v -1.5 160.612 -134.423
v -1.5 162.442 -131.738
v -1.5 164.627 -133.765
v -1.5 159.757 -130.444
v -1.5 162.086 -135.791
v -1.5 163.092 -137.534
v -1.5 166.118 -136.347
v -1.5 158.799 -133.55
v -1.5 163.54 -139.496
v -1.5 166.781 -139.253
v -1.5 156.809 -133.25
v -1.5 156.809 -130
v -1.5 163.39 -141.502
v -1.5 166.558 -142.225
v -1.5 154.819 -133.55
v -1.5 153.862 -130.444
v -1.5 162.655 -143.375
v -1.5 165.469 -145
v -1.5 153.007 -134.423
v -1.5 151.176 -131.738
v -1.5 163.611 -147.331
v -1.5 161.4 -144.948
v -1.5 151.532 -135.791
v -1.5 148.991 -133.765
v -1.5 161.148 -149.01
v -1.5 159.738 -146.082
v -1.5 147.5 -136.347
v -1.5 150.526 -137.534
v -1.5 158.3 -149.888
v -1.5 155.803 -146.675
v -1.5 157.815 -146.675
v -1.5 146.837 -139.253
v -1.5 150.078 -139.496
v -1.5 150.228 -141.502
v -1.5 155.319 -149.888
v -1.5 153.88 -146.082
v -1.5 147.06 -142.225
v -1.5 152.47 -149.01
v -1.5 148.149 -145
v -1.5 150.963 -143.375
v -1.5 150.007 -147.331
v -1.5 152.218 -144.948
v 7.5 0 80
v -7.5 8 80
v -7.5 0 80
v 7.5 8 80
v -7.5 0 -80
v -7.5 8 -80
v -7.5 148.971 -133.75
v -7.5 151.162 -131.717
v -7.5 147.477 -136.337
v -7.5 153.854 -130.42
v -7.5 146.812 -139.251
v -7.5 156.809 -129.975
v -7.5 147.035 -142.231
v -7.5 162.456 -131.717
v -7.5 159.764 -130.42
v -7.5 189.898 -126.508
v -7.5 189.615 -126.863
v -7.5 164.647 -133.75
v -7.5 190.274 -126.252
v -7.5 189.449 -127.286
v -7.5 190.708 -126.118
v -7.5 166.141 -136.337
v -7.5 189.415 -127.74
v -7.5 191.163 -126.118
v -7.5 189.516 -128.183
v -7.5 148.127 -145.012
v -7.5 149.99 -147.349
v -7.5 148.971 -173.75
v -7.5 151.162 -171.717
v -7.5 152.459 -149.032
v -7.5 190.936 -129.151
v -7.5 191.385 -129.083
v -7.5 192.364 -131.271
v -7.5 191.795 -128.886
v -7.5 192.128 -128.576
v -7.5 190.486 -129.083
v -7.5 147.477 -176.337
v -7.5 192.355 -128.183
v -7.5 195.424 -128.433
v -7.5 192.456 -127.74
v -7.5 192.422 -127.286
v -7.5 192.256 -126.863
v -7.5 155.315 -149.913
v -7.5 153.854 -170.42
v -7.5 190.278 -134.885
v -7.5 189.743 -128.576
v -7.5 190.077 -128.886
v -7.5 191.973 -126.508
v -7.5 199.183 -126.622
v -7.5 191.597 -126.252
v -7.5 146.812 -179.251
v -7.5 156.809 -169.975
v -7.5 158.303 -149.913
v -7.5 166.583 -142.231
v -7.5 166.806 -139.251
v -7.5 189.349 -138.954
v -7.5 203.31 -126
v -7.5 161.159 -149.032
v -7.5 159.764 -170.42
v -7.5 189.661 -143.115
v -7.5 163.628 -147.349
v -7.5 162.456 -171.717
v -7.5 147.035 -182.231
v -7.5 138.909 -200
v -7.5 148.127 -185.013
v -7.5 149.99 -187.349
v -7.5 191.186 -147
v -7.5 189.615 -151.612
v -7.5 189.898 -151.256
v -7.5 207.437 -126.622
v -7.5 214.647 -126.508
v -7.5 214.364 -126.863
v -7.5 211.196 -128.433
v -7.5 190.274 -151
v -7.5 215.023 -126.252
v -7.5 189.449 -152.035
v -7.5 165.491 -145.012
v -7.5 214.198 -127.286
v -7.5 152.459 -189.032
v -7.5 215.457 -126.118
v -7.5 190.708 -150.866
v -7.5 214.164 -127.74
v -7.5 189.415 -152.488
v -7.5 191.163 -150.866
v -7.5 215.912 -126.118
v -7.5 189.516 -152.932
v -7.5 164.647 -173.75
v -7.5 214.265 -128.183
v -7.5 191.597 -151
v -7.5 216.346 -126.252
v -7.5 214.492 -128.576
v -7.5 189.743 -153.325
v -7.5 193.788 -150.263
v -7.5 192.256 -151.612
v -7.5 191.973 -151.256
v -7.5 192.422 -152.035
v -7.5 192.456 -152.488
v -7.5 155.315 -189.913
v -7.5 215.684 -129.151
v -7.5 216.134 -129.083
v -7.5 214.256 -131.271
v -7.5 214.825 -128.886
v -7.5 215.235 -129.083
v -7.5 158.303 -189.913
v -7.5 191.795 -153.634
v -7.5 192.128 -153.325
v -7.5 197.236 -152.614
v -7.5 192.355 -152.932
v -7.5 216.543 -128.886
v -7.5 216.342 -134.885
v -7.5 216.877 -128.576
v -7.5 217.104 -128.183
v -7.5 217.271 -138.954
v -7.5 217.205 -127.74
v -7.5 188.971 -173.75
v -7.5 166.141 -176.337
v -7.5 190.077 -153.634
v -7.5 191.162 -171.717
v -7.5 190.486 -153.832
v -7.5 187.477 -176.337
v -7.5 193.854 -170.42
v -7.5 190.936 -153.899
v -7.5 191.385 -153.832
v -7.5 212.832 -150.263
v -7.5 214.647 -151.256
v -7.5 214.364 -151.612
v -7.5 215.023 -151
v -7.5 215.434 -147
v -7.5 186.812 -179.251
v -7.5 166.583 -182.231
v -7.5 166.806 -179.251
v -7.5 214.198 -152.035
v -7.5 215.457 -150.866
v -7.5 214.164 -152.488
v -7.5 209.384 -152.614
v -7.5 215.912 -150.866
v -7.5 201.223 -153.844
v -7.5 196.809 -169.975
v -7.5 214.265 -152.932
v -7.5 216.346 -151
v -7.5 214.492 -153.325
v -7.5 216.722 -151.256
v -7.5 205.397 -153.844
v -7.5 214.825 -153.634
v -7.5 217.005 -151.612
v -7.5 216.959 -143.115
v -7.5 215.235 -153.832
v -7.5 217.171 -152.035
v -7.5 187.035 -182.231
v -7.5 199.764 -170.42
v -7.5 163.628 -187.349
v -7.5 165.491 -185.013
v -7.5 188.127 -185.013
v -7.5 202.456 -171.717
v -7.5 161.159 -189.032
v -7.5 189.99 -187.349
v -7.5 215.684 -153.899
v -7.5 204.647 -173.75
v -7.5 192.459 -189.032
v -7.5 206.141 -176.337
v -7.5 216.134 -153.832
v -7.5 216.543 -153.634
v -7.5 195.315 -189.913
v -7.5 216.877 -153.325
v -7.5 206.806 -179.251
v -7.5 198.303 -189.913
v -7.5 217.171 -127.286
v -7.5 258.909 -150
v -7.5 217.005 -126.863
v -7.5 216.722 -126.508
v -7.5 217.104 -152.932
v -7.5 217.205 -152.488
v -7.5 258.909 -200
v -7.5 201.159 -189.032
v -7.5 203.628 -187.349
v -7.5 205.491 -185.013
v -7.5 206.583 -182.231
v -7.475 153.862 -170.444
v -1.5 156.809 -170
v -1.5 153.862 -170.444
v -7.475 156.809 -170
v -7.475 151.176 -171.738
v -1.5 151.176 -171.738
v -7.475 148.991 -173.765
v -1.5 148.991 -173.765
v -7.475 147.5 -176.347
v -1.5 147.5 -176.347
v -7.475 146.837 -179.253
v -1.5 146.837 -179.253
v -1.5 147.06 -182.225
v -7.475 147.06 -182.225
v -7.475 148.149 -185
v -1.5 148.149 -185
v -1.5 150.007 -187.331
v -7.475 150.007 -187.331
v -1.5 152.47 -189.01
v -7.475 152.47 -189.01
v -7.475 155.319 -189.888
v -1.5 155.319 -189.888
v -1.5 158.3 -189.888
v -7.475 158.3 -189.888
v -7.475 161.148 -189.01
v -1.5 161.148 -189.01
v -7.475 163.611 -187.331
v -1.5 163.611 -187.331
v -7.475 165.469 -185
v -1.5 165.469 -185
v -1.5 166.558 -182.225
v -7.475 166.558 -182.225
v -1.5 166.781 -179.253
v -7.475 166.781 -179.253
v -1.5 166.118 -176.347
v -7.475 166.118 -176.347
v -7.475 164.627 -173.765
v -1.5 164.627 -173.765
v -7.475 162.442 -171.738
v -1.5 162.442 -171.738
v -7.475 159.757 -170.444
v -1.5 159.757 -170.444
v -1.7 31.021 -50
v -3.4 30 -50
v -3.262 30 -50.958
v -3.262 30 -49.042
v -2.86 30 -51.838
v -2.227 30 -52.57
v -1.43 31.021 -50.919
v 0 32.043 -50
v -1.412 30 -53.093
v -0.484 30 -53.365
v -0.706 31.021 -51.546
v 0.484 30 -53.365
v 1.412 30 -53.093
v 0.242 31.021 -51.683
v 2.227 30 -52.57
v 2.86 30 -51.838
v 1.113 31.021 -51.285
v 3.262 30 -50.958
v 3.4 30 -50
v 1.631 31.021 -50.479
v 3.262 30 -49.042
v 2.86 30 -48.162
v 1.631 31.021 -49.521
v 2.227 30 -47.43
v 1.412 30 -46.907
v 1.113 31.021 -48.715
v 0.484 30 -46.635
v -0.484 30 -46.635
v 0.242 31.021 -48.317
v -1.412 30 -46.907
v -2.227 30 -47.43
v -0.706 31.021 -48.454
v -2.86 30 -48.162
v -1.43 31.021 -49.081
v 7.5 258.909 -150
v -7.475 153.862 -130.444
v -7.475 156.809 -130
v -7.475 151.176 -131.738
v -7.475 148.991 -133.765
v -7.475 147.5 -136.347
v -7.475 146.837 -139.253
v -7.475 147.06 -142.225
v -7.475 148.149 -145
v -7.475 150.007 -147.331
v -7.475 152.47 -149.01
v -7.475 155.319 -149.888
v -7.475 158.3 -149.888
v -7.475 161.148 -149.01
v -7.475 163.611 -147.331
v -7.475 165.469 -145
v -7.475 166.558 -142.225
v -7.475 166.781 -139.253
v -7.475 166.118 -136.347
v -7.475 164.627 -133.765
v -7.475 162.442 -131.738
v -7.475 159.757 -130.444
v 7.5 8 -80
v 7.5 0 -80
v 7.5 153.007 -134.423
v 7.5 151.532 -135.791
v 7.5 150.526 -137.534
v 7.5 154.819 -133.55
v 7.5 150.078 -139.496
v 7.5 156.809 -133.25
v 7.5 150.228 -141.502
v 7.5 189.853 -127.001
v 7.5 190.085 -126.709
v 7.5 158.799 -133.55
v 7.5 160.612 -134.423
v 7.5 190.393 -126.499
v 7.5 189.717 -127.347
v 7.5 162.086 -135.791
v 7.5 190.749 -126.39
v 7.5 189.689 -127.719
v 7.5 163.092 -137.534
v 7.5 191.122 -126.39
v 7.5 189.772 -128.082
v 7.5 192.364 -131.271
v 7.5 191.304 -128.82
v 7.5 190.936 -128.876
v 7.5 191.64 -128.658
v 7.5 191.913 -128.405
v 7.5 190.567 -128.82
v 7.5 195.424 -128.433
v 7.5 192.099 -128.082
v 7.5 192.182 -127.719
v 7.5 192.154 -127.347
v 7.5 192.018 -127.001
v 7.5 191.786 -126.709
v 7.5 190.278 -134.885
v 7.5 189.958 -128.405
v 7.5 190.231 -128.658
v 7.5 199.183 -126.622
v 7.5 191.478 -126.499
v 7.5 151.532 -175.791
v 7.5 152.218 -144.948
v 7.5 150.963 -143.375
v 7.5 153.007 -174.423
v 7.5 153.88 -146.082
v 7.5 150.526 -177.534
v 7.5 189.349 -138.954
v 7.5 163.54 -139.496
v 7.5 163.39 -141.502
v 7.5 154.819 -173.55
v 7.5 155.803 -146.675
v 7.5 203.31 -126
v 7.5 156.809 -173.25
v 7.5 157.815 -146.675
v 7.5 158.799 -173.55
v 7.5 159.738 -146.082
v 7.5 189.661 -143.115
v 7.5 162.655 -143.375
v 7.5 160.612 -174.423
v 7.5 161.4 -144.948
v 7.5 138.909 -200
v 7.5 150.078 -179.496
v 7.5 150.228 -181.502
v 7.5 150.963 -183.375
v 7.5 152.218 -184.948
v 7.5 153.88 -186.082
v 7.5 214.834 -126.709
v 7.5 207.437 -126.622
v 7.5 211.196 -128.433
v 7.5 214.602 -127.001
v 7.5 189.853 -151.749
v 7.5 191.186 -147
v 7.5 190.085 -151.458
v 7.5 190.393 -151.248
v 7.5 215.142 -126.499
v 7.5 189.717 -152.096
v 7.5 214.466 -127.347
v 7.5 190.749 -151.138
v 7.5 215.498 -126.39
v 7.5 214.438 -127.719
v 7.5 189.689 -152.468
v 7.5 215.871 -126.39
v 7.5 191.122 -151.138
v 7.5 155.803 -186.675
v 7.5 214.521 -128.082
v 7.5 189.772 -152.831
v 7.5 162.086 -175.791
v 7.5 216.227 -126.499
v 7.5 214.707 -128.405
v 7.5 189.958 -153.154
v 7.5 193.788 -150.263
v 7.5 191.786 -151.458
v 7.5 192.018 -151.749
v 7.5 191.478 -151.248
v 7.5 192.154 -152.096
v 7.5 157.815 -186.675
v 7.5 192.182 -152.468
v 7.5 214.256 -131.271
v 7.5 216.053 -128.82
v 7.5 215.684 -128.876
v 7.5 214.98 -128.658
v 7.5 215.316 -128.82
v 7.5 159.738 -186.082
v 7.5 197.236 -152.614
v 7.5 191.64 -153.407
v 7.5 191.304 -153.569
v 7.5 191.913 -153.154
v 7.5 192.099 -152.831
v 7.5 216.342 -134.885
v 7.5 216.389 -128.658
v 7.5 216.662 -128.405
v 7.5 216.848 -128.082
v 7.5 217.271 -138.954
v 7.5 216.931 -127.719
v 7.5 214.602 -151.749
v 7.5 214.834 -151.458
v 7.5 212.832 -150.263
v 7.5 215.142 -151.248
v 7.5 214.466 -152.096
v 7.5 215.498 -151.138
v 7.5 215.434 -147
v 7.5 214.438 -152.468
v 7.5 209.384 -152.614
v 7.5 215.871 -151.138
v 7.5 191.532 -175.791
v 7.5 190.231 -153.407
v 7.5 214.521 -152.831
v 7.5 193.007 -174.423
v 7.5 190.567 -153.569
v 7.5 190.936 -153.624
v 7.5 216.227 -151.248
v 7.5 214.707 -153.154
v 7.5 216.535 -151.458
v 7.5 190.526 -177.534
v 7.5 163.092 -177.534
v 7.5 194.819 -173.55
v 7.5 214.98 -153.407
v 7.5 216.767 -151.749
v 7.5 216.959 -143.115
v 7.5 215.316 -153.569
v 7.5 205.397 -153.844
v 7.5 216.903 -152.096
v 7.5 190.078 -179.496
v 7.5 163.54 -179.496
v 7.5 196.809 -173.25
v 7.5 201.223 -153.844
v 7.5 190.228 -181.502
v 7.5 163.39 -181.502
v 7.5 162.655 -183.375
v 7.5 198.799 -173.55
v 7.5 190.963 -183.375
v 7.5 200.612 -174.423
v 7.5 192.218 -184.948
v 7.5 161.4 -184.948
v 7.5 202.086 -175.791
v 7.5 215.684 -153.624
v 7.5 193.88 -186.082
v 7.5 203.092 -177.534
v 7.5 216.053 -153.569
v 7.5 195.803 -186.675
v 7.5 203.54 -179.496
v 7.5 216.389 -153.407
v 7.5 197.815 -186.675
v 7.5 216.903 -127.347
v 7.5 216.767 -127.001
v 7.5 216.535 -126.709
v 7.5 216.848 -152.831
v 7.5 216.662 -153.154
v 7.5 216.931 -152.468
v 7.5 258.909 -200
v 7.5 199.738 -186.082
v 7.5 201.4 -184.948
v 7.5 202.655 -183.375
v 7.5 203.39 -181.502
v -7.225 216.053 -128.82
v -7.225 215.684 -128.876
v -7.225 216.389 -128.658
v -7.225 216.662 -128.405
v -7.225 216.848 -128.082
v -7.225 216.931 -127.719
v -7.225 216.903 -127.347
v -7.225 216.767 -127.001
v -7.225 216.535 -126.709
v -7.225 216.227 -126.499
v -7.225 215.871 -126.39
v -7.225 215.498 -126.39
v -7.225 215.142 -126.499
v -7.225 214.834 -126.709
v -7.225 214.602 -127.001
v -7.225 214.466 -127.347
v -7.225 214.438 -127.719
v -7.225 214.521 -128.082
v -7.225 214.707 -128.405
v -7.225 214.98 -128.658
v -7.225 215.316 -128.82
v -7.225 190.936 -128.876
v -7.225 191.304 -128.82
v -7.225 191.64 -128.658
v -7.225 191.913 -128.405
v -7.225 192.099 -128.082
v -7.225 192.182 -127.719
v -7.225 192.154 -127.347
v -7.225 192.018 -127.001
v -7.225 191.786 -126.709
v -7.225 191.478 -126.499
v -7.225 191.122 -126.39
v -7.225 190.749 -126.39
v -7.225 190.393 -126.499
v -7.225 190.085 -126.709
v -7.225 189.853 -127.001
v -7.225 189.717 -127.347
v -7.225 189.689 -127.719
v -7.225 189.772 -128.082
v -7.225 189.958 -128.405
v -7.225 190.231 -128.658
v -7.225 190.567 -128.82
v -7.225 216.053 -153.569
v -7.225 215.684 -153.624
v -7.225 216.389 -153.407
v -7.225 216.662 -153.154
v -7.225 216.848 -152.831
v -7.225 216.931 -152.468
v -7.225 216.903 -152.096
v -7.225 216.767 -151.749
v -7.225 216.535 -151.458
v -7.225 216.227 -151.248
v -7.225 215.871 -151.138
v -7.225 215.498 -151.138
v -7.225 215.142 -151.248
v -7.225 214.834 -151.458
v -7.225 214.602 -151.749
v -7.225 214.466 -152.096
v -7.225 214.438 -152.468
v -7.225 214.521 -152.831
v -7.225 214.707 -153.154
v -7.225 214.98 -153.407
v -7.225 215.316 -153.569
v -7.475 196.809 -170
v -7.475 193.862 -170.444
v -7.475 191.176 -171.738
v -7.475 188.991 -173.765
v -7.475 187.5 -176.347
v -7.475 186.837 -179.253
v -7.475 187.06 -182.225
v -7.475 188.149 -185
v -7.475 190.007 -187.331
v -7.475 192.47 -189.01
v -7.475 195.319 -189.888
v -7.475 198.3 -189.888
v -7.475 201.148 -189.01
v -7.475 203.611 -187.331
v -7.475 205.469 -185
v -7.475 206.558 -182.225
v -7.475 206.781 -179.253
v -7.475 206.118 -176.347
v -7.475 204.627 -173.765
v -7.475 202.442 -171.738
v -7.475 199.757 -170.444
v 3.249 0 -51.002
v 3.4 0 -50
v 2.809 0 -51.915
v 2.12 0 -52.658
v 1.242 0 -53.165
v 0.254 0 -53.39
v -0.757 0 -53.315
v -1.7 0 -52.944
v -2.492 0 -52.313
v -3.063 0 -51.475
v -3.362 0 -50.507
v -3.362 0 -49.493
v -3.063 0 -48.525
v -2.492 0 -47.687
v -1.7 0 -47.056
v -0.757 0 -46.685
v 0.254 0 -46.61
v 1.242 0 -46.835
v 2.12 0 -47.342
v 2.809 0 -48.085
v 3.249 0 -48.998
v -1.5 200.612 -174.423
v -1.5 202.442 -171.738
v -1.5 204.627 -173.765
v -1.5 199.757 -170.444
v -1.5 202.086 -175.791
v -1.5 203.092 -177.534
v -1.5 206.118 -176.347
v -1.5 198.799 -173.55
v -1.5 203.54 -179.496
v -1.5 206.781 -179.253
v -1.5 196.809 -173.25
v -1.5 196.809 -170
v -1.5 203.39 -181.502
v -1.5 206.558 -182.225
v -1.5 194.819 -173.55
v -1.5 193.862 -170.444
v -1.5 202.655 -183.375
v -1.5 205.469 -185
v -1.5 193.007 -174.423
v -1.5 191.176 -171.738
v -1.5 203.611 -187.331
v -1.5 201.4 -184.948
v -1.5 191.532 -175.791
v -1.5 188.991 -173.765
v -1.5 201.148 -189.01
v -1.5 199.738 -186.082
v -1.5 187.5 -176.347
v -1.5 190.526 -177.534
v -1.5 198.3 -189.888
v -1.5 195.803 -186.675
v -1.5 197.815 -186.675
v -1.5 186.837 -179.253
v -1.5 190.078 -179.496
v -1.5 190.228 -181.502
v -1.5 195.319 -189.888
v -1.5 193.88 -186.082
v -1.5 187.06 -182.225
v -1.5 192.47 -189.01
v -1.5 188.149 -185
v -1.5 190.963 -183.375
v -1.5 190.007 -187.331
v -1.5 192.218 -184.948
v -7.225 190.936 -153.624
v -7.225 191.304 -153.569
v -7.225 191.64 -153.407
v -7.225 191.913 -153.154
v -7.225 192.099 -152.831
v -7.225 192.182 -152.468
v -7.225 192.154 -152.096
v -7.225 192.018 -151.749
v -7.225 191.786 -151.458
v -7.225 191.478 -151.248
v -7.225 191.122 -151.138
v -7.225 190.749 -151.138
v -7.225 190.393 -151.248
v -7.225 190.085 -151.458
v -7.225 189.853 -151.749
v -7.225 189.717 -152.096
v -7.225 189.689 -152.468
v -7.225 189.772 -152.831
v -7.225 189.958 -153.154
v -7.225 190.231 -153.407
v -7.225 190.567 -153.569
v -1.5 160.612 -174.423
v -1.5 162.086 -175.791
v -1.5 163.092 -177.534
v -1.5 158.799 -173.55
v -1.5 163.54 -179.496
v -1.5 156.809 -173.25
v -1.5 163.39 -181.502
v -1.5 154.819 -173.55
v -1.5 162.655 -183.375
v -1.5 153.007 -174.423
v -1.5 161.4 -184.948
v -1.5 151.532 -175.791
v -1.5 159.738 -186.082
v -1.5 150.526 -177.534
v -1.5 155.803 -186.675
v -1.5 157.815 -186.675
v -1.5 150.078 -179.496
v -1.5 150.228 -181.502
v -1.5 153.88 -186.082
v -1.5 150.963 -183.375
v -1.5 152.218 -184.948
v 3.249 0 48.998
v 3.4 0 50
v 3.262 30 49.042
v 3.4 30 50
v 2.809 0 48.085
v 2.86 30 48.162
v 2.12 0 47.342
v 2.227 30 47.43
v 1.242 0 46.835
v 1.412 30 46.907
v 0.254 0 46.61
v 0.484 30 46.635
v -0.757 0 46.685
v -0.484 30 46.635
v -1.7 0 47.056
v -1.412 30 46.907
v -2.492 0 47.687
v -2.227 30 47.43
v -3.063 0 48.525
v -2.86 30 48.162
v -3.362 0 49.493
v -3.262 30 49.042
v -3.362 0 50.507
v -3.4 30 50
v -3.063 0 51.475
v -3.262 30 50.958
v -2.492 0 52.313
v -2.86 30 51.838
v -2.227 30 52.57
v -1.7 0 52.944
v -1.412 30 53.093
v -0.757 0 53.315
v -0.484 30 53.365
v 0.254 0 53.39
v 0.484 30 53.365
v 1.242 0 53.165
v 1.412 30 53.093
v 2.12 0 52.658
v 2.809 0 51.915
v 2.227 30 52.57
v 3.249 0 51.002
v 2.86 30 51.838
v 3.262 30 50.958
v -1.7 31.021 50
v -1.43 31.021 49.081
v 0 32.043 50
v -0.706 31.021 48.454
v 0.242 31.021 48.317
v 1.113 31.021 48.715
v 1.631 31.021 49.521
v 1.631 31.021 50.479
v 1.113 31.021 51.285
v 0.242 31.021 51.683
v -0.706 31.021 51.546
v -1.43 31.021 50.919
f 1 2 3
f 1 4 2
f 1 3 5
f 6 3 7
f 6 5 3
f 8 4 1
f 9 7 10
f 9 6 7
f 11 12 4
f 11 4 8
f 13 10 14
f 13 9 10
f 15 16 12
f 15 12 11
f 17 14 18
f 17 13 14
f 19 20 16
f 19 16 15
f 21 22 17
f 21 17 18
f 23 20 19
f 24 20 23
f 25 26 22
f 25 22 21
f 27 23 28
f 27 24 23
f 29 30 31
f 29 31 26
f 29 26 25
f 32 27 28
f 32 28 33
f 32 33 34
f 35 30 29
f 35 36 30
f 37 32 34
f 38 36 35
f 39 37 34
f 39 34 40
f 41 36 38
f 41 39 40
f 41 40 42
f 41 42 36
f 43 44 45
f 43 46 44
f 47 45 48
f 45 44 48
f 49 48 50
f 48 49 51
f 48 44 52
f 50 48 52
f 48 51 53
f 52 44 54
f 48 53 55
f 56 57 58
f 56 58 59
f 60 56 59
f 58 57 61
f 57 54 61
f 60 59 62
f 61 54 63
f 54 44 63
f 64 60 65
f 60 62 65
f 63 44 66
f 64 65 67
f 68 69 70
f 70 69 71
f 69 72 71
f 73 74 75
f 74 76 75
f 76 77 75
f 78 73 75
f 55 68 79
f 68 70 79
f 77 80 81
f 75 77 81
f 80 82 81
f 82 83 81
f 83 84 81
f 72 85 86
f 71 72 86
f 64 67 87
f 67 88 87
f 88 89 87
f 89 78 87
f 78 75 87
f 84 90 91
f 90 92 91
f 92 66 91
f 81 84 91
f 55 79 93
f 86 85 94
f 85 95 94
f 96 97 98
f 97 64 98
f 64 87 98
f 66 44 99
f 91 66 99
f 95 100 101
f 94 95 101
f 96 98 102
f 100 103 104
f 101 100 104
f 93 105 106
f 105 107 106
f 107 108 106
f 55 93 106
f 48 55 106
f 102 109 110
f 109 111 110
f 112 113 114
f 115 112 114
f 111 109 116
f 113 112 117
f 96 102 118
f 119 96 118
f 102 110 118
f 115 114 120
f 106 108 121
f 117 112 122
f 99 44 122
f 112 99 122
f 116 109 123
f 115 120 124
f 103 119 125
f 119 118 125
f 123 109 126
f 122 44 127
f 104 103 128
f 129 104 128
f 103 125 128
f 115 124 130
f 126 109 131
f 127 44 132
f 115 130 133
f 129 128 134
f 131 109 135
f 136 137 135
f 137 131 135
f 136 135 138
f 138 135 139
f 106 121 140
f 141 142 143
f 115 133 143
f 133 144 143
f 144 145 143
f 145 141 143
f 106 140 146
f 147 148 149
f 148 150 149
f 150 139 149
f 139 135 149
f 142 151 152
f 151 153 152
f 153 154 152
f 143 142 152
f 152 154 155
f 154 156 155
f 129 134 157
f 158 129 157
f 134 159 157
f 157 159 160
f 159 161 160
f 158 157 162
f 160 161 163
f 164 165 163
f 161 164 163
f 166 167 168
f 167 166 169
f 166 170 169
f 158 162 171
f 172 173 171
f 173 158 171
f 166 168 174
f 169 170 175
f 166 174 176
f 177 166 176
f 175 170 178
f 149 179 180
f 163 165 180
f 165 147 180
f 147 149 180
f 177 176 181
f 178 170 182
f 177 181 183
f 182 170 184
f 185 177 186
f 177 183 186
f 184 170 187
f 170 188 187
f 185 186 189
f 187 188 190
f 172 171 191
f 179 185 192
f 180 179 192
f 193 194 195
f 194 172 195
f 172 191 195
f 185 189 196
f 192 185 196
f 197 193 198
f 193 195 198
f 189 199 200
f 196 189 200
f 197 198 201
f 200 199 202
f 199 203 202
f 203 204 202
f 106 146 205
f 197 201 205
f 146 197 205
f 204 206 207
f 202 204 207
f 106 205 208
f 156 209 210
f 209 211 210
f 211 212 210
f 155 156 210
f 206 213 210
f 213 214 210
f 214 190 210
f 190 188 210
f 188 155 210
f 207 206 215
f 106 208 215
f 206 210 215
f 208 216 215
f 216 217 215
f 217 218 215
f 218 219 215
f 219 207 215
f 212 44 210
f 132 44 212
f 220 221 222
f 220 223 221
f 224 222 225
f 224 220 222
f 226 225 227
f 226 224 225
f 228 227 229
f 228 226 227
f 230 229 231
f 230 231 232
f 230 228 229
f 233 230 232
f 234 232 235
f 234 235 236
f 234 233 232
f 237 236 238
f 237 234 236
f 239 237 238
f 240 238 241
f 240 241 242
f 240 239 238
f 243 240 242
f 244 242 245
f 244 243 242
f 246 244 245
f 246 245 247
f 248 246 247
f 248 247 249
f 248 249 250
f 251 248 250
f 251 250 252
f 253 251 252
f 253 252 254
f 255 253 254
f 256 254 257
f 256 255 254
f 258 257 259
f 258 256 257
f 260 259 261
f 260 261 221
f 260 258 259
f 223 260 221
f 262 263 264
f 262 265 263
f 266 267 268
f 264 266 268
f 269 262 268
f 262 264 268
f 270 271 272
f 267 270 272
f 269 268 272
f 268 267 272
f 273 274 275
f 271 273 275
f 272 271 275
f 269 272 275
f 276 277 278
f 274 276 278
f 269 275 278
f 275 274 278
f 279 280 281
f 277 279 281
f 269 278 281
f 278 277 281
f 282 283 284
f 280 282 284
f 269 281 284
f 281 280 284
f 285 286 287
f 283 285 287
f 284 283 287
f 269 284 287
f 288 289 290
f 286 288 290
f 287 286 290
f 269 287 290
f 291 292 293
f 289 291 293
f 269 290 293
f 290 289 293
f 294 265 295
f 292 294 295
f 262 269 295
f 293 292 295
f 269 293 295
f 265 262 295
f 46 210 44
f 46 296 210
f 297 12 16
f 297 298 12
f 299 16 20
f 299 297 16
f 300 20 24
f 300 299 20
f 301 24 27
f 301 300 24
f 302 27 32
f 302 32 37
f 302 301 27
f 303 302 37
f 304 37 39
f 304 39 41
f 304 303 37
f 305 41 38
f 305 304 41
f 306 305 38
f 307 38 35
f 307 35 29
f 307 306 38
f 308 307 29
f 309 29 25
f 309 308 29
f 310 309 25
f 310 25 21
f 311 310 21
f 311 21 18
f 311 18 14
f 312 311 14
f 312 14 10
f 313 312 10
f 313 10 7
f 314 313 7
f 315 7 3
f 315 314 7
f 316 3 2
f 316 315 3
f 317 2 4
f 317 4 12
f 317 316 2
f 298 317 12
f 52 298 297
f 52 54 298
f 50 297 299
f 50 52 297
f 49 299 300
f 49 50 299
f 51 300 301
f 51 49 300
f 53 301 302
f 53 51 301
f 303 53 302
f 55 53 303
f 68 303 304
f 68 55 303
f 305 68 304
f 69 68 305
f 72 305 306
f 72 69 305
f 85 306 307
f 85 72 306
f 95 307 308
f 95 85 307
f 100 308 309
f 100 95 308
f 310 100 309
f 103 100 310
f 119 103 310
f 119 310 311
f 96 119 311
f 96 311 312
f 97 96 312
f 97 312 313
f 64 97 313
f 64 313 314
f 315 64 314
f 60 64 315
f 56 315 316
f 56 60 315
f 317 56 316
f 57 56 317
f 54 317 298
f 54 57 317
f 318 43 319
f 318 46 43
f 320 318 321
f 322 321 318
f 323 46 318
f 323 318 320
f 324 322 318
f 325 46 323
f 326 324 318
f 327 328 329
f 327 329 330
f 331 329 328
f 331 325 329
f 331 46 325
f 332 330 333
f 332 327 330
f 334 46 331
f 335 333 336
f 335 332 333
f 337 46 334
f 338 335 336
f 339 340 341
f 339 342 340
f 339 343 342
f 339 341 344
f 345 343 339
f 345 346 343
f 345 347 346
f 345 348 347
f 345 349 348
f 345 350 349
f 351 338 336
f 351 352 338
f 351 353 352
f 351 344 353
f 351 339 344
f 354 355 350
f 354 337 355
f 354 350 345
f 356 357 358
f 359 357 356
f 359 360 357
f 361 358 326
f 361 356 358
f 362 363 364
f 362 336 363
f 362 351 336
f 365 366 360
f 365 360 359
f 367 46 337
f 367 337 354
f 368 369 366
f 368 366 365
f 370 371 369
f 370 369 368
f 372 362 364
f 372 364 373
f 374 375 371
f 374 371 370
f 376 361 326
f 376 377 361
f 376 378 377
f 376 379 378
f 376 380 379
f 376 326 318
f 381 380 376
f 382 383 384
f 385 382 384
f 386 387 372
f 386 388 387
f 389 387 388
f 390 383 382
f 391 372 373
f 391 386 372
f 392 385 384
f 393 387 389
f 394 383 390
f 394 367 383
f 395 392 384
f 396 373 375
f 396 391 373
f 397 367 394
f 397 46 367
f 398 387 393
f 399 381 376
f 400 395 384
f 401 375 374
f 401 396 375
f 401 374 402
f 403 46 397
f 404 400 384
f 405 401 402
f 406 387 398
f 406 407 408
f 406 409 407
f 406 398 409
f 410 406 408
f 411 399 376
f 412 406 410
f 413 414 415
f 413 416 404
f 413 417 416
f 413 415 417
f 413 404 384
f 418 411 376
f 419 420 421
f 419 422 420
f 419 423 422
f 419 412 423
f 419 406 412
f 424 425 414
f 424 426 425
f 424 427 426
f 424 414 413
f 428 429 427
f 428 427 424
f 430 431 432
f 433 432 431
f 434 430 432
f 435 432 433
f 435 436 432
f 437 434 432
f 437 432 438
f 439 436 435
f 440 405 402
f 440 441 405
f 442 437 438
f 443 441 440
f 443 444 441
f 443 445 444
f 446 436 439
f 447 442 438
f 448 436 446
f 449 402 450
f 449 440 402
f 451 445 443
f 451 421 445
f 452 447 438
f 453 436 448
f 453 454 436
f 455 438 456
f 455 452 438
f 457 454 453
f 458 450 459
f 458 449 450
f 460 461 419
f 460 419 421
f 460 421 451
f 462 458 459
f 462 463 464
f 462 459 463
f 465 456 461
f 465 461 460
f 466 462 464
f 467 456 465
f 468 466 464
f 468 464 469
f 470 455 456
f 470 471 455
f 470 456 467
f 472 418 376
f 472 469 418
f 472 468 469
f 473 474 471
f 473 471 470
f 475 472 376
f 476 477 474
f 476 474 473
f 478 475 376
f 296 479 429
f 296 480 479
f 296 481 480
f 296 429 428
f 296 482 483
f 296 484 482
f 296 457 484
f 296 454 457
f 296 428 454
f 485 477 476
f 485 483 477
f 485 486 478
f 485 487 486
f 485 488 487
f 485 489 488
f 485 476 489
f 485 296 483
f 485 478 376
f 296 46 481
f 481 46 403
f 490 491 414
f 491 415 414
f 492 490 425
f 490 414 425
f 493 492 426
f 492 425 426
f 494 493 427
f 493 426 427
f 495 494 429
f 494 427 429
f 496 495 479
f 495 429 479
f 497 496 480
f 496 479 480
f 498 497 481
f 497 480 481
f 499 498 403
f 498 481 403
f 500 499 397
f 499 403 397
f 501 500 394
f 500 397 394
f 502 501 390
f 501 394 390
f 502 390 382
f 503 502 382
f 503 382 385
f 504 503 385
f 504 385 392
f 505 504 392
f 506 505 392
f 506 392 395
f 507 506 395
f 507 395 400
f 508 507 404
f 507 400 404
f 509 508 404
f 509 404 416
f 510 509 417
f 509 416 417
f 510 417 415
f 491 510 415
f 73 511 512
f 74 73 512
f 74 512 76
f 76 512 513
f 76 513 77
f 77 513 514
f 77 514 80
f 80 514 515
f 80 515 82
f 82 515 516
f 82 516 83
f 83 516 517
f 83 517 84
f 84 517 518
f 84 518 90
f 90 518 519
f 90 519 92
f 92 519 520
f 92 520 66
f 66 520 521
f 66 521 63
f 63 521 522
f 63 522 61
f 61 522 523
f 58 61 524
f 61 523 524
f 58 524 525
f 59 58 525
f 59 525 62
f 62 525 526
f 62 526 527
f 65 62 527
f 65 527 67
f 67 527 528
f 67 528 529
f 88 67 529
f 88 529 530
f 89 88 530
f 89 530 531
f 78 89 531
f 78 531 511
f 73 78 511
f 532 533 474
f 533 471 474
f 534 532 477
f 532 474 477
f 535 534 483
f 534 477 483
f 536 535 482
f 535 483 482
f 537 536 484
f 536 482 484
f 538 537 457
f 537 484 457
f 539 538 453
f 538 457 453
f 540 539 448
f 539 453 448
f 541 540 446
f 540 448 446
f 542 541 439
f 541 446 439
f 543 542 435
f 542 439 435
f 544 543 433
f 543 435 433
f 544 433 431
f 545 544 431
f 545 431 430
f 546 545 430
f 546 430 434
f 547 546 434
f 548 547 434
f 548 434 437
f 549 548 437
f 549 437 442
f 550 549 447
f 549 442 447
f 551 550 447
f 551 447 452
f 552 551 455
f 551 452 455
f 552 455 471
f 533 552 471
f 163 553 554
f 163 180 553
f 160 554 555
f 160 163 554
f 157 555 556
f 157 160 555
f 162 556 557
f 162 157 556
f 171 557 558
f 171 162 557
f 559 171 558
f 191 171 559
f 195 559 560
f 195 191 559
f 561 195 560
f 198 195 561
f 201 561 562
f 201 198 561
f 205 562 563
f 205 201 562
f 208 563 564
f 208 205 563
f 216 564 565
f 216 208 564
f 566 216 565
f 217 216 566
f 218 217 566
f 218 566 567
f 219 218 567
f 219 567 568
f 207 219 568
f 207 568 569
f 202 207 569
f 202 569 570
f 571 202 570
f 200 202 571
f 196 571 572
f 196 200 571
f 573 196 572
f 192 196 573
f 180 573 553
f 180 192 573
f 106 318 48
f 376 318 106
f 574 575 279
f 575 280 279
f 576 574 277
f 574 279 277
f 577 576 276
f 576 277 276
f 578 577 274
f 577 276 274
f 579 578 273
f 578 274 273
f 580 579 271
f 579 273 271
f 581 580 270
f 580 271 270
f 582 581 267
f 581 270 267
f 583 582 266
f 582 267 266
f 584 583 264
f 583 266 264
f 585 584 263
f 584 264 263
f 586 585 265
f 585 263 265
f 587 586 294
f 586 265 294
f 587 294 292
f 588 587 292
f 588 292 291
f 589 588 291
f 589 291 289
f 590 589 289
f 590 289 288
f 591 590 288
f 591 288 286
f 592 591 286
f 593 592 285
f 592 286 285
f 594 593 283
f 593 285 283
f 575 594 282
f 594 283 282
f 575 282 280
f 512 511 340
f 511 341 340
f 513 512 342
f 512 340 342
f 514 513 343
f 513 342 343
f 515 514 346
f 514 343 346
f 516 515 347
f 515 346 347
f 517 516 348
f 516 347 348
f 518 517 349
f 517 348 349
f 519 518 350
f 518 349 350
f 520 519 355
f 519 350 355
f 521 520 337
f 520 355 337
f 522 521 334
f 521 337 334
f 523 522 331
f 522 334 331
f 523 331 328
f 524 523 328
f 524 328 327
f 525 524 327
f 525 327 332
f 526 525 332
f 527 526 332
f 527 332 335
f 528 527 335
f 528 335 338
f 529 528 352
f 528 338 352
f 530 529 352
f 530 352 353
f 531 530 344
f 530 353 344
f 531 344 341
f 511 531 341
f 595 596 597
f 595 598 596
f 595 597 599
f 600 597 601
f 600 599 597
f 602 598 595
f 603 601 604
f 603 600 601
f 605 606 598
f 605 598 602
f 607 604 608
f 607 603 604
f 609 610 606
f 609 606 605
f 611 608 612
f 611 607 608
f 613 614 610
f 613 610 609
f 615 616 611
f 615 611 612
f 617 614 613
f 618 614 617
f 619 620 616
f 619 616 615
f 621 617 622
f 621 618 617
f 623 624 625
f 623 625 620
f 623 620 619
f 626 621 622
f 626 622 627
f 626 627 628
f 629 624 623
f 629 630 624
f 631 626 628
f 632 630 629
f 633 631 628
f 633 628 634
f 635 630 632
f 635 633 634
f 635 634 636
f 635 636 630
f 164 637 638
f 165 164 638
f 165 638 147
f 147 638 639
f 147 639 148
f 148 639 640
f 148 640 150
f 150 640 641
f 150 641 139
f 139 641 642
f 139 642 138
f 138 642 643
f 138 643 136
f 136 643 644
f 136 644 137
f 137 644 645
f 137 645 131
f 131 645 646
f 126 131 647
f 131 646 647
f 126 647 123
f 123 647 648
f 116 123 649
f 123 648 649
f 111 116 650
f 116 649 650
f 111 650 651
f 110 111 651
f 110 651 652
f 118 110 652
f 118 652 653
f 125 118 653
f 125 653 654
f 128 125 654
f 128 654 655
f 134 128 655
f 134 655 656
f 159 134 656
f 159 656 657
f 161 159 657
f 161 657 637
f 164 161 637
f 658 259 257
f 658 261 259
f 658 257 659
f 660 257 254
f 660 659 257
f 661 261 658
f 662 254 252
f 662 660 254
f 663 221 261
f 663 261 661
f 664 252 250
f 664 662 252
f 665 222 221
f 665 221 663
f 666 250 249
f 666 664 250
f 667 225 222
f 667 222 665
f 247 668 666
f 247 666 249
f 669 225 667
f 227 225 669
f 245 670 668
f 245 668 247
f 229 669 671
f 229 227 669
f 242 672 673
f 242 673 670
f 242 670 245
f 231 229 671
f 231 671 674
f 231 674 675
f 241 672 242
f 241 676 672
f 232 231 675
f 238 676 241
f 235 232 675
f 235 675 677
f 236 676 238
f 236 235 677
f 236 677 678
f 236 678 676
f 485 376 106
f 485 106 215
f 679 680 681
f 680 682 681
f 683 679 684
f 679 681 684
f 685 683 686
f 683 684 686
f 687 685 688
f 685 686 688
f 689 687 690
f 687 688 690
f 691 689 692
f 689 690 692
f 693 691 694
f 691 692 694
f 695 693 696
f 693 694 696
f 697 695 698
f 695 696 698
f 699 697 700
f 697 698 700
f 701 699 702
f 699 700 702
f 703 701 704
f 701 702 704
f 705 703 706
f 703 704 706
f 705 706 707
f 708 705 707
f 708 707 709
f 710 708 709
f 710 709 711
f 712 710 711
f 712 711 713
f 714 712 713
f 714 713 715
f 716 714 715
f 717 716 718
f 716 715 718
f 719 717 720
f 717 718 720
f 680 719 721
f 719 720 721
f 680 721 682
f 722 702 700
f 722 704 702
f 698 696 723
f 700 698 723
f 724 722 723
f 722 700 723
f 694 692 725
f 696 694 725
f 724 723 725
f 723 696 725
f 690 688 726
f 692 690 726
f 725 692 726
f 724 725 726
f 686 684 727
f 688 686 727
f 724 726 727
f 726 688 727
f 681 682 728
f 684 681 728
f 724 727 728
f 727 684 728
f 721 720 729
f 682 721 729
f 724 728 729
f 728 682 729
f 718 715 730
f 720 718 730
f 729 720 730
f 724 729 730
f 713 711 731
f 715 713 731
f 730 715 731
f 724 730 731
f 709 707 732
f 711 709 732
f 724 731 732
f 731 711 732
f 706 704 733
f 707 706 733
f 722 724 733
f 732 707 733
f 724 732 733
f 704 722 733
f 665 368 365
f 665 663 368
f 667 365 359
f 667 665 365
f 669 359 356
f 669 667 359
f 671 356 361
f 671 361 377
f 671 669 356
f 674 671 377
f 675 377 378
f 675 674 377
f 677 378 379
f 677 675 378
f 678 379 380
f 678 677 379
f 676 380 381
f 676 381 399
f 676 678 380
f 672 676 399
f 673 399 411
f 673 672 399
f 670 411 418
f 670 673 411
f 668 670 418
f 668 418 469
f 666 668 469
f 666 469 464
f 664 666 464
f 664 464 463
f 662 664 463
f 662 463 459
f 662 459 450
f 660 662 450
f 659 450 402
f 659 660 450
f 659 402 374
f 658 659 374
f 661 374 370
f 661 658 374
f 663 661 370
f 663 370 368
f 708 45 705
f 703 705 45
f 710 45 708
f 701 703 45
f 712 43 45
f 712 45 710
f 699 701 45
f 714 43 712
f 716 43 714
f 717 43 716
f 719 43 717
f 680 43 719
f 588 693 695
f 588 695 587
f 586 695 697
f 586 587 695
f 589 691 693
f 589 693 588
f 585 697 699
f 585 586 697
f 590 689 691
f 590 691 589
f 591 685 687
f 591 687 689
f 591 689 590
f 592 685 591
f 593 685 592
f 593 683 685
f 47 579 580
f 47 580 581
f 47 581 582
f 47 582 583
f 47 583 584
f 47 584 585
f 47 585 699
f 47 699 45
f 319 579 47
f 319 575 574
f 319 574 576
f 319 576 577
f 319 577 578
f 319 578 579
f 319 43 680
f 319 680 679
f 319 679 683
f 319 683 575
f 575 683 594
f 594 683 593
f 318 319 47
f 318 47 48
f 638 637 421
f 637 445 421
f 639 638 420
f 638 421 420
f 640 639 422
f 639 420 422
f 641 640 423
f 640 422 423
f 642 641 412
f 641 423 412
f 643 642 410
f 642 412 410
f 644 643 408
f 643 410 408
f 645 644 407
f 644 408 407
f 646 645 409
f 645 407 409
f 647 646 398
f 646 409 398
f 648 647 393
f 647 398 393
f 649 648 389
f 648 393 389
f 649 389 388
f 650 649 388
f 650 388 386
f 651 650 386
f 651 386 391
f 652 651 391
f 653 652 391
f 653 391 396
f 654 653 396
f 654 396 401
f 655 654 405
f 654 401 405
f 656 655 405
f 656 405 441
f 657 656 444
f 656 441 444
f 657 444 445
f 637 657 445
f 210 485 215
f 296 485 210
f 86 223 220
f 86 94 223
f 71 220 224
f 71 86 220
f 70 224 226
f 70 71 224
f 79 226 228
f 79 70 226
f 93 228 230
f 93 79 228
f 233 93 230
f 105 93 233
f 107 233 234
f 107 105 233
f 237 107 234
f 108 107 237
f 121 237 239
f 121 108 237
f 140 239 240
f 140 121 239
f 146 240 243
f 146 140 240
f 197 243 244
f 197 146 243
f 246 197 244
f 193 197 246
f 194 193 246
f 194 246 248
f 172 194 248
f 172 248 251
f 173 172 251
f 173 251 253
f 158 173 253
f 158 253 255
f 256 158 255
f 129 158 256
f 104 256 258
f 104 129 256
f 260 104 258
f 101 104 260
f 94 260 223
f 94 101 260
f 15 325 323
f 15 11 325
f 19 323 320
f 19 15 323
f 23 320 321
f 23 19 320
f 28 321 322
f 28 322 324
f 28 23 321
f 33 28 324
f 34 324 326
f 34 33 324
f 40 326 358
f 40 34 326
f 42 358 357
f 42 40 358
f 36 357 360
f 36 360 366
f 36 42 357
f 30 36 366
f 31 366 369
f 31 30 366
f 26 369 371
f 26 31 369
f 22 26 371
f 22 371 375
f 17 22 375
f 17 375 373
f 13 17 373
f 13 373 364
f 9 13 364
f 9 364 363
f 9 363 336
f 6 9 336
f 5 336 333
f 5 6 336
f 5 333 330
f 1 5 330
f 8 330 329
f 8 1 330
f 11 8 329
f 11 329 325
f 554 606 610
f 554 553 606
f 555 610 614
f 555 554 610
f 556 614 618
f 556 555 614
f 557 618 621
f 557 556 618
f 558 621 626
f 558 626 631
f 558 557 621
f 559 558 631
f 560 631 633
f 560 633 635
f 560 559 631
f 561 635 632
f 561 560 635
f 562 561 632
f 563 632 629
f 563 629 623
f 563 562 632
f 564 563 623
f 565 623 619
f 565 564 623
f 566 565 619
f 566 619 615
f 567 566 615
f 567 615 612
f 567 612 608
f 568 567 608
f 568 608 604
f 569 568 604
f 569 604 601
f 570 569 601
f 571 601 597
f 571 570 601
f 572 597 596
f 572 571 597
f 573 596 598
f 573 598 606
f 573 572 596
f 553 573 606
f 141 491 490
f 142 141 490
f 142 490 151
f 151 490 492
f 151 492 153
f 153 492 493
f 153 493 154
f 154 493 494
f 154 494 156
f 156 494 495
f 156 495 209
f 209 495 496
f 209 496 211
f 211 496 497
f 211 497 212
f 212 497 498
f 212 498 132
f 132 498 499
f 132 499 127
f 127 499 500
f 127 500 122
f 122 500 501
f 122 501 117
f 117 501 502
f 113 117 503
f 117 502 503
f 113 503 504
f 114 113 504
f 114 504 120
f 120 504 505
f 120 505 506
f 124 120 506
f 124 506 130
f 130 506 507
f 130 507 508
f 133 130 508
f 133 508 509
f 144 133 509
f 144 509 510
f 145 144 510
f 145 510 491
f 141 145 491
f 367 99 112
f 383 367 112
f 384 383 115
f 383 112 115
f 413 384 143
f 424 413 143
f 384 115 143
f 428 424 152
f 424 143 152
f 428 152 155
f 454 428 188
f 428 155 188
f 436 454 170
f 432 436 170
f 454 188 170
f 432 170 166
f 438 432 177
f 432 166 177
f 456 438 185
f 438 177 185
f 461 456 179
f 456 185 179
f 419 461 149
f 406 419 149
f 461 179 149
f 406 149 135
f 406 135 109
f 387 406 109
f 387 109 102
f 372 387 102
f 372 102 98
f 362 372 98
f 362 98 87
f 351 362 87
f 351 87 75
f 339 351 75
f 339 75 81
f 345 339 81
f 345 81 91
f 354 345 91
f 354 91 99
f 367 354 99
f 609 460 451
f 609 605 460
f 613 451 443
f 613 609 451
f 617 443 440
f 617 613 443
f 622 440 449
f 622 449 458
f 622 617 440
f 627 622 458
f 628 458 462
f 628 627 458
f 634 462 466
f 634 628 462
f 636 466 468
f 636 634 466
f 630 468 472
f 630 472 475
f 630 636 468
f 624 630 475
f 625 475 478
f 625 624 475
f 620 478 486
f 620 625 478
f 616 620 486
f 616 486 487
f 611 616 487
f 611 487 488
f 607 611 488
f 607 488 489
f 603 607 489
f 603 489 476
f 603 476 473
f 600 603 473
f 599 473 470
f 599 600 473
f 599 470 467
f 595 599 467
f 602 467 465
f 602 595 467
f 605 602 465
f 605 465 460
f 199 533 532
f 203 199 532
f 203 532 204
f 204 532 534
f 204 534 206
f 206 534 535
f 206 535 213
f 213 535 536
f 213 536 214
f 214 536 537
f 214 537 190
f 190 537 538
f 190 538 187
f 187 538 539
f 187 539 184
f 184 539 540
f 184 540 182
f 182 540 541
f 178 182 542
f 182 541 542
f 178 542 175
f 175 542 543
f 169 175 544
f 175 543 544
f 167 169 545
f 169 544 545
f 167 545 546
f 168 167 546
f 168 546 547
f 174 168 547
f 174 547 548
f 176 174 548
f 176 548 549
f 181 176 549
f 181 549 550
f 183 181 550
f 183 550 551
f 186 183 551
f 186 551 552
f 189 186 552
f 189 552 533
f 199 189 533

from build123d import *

# Parameters (mm, degrees)
EXTRUDE_738_DEPTH          = 7.5
HOLE_WIZARD_M8_D           = 6.8
HOLE_WIZARD_M8_DEPTH       = 30
HOLE_WIZARD_M8_TIP         = 2.042926105
HOLE_WIZARD_M12_AT_2_COUNT = 2
HOLE_WIZARD_M12_AT_2_PITCH = 40
HOLE_WIZARD_M12_AT_3_COUNT = 2
HOLE_WIZARD_M12_AT_3_PITCH = 56.568542495
SKETCH_12_R                = 14
CUT_EXTRUDE_1_DEPTH        = 328.504072273
FF10_M3_D                  = 2.5
FF10_M3_CSINK_D            = 3.05
FF10_M3_CSINK_ANGLE        = 90


with BuildPart() as part:
    # Эскиз1 → Extrude 738 (new, symmetric)
    with BuildSketch(Plane(origin=(0, 0, 0), x_dir=(0, 0, -1), z_dir=(1, 0, 0))):
        Polygon((-80, 0), (0, 0), (80, 0), (80, 8), (200, 138.909090909), (200, 258.909090909), (150, 258.909090909), (-80, 8), align=None)
    extrude(amount=EXTRUDE_738_DEPTH, both=True)

    # Крепление к плите M8
    with Locations(Plane(origin=(0, 0, 0), x_dir=(-1, 0, 0), z_dir=(0, -1, 0))):
        with Locations((0, -50), (0, 50)):
            Hole(HOLE_WIZARD_M8_D / 2, depth=HOLE_WIZARD_M8_DEPTH)
            with Locations((0, 0, -(HOLE_WIZARD_M8_DEPTH + HOLE_WIZARD_M8_TIP / 2))):  # 118° drill point
                Cone(0, HOLE_WIZARD_M8_D / 2, HOLE_WIZARD_M8_TIP, mode=Mode.SUBTRACT)

    # Эскиз9 → К профилю M12 (revolve, cut)
    with BuildSketch(Plane(origin=(-7.5, 196.809090909, -180), x_dir=(0, 0, 1), z_dir=(0, 1, 0))):
        Polygon((0, 0), (0, 15), (6.75, 15), (6.75, 6), (10, 6), (10, 0.025), (10.025, 0), align=None)
    hole_wizard_m12 = revolve(axis=Axis((-13.85, 196.809090909, -180), (1, 0, 0)), mode=Mode.SUBTRACT)

    # К профилю M12 at 2: К профилю M12 ×2
    with Locations(*[(0, -i * HOLE_WIZARD_M12_AT_2_PITCH, 0) for i in range(1, HOLE_WIZARD_M12_AT_2_COUNT)]):
        add(hole_wizard_m12, mode=Mode.SUBTRACT)

    # К профилю M12 at 3: К профилю M12 ×2
    with Locations(*[Vector(0, -0.7071067811865478, 0.7071067811865474) * (i * HOLE_WIZARD_M12_AT_3_PITCH) for i in range(1, HOLE_WIZARD_M12_AT_3_COUNT)]):
        add(hole_wizard_m12, mode=Mode.SUBTRACT)

    # Эскиз12 → Вырез-Вытянуть1 (cut, through all)
    with BuildSketch(Plane.ZY.offset(7.5)):
        with Locations((-140, 203.31)):
            Circle(SKETCH_12_R)
    extrude(amount=-CUT_EXTRUDE_1_DEPTH, mode=Mode.SUBTRACT)

    # FF10-M3 (through all)
    with Locations(Plane.ZY.offset(7.5)):
        with Locations((-127.625631329, 215.684368671), (-127.625631329, 190.935631329), (-152.374368671, 190.935631329), (-152.374368671, 215.684368671)):
            CounterSinkHole(FF10_M3_D / 2, FF10_M3_CSINK_D / 2, counter_sink_angle=FF10_M3_CSINK_ANGLE)


solid = part.part
